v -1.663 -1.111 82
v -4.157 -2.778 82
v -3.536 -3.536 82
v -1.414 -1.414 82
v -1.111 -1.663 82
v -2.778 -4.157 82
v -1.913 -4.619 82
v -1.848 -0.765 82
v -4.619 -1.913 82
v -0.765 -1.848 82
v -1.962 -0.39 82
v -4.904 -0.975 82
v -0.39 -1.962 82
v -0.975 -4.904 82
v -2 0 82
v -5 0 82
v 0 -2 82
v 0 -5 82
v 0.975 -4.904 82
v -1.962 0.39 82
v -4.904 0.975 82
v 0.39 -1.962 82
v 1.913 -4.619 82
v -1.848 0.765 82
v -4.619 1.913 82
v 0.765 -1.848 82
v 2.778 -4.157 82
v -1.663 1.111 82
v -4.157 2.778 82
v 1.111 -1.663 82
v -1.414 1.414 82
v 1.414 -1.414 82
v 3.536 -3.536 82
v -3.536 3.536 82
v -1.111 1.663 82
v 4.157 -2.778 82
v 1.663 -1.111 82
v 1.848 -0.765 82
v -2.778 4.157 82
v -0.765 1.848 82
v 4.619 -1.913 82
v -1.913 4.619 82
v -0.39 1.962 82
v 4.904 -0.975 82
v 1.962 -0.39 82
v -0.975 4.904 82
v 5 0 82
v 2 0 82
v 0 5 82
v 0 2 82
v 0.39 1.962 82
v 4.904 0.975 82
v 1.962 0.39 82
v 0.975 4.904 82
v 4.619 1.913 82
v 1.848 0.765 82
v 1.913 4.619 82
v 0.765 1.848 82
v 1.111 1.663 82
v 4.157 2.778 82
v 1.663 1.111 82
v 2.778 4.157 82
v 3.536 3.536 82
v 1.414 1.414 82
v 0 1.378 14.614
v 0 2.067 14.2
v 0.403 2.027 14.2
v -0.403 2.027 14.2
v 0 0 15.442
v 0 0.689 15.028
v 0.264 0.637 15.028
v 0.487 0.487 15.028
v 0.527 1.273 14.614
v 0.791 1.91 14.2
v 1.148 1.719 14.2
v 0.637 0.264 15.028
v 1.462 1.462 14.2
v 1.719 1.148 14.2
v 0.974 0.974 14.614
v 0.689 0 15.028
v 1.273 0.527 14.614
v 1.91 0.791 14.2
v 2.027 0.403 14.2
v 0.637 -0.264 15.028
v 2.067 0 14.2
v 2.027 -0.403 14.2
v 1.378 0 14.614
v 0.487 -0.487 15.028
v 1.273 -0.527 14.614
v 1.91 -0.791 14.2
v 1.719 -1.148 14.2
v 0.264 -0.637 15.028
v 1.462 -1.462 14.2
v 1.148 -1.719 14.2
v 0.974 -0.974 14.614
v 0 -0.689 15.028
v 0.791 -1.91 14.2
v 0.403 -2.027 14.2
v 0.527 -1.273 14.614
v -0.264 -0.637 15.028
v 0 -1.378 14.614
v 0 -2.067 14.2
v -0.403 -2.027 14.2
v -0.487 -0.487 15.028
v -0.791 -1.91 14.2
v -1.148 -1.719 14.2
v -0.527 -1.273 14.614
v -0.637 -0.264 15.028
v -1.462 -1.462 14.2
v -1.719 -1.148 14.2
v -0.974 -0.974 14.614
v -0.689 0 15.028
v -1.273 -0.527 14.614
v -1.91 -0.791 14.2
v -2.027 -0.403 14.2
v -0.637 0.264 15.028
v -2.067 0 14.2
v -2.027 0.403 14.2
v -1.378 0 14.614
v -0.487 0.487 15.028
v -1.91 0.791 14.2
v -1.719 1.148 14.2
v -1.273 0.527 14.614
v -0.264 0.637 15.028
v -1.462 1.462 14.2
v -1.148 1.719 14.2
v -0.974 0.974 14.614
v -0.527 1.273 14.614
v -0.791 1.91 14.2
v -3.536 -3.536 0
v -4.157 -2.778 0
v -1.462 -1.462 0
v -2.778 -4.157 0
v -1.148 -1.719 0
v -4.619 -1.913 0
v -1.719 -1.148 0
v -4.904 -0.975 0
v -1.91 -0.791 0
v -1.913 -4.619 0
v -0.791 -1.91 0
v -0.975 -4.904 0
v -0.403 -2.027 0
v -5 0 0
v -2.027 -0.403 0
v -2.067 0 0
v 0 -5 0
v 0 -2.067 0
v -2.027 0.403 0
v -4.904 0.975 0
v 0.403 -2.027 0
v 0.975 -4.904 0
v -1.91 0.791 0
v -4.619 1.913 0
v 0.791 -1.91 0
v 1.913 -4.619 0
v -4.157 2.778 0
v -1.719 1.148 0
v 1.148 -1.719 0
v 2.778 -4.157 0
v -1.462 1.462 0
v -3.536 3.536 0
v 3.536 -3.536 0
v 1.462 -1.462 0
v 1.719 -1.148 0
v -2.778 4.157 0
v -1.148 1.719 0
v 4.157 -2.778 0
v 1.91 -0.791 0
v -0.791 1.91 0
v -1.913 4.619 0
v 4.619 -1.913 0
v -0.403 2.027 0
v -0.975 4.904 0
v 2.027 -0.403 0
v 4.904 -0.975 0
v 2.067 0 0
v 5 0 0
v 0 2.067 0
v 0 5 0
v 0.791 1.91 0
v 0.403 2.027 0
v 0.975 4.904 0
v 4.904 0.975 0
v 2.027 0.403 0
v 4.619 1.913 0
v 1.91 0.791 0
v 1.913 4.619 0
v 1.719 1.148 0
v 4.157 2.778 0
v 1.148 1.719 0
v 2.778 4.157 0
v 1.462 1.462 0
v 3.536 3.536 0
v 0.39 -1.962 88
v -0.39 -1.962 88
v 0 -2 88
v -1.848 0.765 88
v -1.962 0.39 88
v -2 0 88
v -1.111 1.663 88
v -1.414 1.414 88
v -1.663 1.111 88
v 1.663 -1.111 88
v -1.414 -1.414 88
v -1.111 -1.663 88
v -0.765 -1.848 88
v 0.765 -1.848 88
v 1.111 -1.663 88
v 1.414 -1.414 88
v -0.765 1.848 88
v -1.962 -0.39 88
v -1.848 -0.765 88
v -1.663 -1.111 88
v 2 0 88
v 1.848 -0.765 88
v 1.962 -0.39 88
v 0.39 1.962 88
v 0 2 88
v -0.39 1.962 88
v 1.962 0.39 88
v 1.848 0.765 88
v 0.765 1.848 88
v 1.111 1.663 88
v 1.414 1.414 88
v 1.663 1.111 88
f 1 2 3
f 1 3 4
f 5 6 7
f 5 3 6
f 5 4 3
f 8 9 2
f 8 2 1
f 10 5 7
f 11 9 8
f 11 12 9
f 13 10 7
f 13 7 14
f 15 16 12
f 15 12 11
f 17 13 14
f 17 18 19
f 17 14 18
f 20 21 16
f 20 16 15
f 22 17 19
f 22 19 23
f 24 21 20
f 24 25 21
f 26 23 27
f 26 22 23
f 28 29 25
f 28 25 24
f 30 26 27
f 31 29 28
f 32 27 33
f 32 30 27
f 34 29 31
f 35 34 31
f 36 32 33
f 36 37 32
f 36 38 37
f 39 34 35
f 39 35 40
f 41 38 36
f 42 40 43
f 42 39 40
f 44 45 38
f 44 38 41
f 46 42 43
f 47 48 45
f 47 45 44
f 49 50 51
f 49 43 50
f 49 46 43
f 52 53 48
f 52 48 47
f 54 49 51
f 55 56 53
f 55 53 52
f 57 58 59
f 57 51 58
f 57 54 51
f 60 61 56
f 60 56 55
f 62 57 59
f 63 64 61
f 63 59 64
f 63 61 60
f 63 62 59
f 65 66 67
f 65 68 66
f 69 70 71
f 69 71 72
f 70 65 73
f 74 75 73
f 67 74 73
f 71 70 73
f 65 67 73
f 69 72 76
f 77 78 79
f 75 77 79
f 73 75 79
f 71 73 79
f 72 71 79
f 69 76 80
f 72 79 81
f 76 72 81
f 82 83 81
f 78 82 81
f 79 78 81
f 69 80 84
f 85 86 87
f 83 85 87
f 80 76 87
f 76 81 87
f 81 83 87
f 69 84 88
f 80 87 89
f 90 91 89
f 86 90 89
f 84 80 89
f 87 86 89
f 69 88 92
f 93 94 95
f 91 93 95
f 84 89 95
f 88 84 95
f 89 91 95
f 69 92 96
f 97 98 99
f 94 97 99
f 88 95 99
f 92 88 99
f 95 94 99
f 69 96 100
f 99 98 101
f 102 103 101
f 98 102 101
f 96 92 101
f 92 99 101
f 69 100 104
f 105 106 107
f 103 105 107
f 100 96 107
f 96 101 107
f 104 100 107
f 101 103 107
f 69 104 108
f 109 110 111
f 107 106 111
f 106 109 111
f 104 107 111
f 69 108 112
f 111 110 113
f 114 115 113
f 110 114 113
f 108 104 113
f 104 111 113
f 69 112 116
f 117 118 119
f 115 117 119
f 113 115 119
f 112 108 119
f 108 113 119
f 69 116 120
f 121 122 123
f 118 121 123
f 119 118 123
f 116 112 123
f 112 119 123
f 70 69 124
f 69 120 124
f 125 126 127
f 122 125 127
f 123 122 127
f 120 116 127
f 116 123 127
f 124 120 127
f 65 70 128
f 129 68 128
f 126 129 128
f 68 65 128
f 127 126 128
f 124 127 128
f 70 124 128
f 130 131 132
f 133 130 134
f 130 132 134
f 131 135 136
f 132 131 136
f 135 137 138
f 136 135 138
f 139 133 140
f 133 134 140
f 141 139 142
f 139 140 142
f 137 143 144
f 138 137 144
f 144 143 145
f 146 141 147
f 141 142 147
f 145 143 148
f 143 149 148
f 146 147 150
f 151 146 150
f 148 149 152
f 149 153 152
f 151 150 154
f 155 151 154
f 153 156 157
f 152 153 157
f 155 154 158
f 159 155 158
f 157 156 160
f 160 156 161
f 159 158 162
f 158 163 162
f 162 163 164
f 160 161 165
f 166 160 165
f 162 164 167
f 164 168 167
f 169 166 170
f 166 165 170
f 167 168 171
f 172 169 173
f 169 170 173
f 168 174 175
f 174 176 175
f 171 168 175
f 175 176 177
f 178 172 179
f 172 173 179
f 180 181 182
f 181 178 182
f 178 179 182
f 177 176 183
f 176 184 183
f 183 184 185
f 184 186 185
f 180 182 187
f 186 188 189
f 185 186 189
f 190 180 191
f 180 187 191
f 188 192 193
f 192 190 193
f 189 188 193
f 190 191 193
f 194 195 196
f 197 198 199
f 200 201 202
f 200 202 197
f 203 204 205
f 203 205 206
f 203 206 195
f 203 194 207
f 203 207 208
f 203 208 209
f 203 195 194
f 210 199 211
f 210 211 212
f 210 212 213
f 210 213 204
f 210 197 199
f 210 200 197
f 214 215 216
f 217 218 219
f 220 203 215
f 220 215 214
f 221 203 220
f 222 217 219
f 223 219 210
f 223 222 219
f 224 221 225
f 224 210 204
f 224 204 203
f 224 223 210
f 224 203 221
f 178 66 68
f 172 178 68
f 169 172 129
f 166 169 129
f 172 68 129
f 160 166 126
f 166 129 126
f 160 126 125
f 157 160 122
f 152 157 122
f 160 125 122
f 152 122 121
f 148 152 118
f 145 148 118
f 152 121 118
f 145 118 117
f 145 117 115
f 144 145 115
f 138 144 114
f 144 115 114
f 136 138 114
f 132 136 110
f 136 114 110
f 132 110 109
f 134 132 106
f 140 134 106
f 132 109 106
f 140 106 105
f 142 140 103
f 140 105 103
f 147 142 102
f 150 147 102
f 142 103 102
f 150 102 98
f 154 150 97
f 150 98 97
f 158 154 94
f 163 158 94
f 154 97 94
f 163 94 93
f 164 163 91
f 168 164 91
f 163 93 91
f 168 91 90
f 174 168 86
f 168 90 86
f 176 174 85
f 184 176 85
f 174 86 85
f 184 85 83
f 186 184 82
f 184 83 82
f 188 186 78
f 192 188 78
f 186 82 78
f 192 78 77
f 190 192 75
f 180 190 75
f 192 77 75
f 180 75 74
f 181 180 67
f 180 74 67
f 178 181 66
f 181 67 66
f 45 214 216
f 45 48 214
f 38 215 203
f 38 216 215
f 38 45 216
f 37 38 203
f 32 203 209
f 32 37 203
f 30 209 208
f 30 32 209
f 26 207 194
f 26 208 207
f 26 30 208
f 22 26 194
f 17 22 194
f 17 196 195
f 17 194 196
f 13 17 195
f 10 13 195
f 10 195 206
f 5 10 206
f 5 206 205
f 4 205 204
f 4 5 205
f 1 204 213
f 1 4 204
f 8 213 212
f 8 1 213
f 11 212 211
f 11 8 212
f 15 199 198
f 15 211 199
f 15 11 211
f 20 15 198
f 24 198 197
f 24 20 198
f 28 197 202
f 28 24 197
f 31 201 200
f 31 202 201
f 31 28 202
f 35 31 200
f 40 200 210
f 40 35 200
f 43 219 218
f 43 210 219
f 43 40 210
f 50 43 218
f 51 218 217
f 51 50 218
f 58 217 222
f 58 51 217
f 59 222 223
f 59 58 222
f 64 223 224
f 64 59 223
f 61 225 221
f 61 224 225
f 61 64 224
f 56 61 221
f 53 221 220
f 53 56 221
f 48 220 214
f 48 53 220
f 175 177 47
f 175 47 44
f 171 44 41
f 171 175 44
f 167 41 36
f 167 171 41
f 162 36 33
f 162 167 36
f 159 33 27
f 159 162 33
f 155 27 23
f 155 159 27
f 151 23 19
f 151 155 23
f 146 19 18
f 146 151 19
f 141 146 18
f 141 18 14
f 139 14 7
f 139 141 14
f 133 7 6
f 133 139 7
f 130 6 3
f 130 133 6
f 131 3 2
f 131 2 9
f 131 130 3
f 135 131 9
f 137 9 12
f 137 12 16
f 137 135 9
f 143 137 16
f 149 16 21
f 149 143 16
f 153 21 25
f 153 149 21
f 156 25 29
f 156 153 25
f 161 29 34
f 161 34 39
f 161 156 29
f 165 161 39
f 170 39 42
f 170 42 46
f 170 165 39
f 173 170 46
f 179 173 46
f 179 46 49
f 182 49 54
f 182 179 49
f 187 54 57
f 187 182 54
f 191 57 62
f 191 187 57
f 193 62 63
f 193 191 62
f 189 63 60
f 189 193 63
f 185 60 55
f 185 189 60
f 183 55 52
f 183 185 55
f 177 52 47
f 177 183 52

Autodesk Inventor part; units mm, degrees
ref_plane "YZ Plane" through (0, 0, 0) normal (1, 0, 0) x (0, 1, 0)
ref_plane "XZ Plane" through (0, 0, 0) normal (0, 1, 0) x (-1, 0, 0)
ref_plane "XY Plane" through (0, 0, 0) normal (0, 0, 1) x (1, 0, 0)
sketch "Skizze1" plane through (0, 0, 0) normal (0, 0, 1) x (1, 0, 0)
  line L0 (-7, 0) -> (7, 0) projected
  line L1 (0, -7) -> (0, 7) projected
  circle A0 centre (0, 0) radius 5
  dimension "d0" = 10
extrude "Extrusion1" add sketch "Skizze1" along normal blind 82
sketch "Skizze2" plane through (0, 0, 82) normal (0, 0, 1) x (1, 0, 0)
  circle A0 centre (0, 0) radius 5 projected
  circle A1 centre (0, 0) radius 2
  dimension "d3" = 4
extrude "Extrusion2" add sketch "Skizze2" along normal blind 6 contours A1
thread "Gewinde1" size "M4x0.7" class "6g" standard "ANSI Metric M Profile" full length
sketch "Skizze3" plane through (0, 0, 0) normal (0, 0, -1) x (-1, 0, 0)
  circle A0 centre (0, 0) radius 5 projected
  circle A1 centre (0, 0) radius 2 projected
hole "Bohrung1" at (0, 0, 0) direction (0, 0, 1) diameter 4.134 depth 14.2 tip angle 118 thread size "M5x0.8" class "6H" standard "ISO Metric profile"
properties part number "24_0497_0011"
